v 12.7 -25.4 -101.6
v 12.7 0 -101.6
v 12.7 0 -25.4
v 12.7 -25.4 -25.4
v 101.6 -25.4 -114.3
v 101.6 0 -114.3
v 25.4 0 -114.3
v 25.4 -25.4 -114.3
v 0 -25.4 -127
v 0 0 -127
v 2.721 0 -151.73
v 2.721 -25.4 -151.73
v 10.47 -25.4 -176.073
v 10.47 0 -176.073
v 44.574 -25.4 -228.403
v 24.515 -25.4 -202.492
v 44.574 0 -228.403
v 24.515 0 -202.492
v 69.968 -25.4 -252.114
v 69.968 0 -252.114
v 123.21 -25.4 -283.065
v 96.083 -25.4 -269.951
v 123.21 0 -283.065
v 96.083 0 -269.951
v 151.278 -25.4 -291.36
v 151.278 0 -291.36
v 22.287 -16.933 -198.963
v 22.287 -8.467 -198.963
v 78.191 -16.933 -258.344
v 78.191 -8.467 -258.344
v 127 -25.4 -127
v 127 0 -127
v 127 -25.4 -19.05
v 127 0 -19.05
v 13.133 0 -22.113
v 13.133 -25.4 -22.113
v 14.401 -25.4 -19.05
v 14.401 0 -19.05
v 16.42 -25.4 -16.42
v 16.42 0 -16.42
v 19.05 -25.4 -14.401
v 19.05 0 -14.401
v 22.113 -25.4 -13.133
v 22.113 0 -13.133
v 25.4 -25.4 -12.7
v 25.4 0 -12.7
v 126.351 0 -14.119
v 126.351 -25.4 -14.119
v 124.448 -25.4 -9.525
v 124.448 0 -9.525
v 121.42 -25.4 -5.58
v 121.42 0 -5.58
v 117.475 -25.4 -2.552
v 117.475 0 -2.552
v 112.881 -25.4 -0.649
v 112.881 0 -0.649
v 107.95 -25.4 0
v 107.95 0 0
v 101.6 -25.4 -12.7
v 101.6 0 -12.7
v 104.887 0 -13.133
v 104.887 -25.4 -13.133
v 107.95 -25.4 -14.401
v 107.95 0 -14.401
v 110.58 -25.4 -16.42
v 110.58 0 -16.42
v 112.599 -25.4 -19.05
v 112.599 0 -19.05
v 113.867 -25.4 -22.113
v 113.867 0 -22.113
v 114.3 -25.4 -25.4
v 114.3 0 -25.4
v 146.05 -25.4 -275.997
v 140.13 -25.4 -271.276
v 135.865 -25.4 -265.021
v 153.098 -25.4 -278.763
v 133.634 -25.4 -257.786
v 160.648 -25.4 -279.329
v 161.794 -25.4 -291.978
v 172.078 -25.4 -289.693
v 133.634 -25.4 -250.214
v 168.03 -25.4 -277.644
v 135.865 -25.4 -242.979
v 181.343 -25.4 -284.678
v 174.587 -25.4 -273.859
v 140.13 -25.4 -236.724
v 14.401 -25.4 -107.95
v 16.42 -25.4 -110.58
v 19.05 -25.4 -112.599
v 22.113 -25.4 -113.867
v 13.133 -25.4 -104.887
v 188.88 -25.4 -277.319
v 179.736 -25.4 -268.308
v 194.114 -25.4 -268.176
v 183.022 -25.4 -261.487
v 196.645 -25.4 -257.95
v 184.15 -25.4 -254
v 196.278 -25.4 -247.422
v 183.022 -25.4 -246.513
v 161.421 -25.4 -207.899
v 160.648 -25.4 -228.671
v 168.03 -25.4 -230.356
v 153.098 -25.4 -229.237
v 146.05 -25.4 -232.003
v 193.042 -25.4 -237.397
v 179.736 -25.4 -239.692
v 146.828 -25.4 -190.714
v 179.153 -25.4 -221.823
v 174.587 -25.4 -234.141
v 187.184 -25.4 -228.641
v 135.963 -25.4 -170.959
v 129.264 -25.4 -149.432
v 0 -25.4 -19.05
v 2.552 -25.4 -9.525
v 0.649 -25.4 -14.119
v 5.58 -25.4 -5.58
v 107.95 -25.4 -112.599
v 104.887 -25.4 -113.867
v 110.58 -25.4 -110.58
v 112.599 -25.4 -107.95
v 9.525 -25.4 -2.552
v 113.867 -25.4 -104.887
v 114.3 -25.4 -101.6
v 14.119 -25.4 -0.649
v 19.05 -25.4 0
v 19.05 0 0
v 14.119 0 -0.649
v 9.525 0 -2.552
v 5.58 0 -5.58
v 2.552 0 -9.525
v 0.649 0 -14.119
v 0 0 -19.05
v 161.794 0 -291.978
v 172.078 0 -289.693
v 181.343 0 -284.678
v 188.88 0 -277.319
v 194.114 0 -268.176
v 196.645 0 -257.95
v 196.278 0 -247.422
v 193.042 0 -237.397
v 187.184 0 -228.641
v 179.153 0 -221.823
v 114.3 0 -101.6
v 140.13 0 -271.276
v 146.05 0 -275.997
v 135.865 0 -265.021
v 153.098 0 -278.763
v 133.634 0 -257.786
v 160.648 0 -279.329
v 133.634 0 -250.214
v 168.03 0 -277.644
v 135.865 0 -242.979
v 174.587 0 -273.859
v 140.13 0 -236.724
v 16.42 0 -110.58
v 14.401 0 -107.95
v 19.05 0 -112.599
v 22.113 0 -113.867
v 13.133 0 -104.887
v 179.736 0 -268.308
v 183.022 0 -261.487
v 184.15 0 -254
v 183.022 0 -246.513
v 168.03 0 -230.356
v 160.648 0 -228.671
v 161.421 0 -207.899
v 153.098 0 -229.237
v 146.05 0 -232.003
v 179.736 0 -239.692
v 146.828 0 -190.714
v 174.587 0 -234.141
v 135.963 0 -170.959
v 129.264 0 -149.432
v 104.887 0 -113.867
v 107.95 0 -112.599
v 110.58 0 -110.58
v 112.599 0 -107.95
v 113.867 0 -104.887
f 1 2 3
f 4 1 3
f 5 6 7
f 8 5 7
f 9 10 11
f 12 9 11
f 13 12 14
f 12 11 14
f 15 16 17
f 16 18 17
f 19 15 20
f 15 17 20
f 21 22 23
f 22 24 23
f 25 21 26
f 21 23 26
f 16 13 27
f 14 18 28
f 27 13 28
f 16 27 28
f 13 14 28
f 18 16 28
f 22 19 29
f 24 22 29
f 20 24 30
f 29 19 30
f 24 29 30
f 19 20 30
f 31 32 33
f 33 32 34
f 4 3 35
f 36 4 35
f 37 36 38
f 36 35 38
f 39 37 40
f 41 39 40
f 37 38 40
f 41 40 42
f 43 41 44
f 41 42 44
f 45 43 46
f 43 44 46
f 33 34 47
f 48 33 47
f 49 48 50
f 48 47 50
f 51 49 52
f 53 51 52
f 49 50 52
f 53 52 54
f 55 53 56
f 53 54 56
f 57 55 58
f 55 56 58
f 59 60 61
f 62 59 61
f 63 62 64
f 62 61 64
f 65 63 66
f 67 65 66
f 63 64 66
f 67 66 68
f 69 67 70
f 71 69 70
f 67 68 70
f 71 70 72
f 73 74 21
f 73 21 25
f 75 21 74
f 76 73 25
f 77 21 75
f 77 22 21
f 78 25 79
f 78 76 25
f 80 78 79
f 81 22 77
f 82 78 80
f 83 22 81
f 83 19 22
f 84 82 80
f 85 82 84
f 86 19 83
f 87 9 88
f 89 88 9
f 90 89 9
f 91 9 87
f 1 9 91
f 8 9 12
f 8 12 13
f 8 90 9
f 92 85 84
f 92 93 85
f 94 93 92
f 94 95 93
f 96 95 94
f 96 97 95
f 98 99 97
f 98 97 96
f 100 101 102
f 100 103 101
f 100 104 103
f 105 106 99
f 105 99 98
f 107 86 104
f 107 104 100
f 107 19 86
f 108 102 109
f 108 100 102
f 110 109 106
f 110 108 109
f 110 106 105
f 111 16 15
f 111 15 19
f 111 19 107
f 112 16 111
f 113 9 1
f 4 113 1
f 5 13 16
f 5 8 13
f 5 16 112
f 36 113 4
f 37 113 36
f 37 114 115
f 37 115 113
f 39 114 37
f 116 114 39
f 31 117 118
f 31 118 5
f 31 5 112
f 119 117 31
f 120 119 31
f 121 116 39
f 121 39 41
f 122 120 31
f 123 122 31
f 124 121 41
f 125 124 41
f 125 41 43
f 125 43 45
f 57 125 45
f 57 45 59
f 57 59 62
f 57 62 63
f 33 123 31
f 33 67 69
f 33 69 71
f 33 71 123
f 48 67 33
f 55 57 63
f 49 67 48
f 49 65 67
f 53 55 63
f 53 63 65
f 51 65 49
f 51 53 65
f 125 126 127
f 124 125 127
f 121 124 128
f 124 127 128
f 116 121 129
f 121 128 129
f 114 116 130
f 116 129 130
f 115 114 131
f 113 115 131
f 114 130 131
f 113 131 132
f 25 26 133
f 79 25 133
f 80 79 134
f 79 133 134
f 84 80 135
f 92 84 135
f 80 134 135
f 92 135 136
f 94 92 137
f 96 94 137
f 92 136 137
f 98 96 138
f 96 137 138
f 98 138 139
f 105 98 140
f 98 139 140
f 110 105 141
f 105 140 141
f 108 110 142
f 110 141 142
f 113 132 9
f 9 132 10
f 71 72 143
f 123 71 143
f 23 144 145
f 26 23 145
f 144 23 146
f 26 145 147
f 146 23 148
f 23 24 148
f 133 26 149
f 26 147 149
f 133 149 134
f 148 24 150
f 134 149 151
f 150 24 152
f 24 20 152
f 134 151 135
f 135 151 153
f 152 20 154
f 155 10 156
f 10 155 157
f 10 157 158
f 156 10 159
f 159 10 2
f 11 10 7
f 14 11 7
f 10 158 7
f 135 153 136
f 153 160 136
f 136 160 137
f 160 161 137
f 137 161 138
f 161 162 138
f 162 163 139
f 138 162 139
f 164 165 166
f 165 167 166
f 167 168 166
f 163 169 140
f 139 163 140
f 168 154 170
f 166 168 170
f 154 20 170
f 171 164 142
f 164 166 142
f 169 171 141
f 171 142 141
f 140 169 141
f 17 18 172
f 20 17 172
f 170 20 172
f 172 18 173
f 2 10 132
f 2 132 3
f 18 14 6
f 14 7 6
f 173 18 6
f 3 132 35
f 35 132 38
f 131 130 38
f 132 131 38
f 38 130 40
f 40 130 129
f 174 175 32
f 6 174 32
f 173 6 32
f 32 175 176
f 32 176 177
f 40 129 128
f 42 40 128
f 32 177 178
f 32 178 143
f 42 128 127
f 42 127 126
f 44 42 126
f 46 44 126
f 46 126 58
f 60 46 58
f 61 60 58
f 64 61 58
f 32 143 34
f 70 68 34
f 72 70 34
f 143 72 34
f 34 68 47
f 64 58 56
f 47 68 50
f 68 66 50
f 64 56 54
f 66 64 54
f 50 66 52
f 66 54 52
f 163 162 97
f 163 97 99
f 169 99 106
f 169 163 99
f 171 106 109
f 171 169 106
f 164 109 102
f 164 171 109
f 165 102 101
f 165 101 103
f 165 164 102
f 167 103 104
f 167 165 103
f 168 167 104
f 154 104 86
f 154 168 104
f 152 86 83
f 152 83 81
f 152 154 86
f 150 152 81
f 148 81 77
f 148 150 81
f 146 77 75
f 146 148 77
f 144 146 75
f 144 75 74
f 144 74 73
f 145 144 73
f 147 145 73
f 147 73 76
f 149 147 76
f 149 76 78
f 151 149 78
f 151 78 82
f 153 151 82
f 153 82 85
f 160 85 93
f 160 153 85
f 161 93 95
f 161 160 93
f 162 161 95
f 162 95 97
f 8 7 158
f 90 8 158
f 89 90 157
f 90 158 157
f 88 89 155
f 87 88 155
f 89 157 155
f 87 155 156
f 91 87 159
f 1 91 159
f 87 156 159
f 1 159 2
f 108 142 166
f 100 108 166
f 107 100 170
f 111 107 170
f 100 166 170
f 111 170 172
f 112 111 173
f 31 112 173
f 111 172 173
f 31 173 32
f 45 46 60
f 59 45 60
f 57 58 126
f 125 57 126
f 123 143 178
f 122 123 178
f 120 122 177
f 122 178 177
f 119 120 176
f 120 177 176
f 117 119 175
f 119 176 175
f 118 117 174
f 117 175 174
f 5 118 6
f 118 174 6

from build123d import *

# Parameters (mm, degrees)
F0_R     = 25.4
F1_DEPTH = 25.4


with BuildPart() as f1:
    # F0 (on Front) → F1 (new body)
    with BuildSketch(Plane.XZ):
        with BuildLine():
            Line((107.95, 0), (19.05, 0))
            ThreePointArc((19.05, 0), (5.579616, -5.579616), (0, -19.05))
            Line((0, -19.05), (0, -127))
            add(Edge.make_bspline(
                [(0, -127), (0, -200.66), (75.077975, -276.120124), (151.277975, -291.360124)],
                knots=[0, 0, 0, 0, 223.381459, 223.381459, 223.381459, 223.381459], degree=3))
            ThreePointArc((151.277975, -291.360124), (194.114391, -268.176383), (179.152879, -221.823417))
            ThreePointArc((179.152879, -221.823417), (140.898422, -181.109618), (127, -127))
            Line((127, -127), (127, -19.05))
            ThreePointArc((127, -19.05), (121.420384, -5.579616), (107.95, 0))
        make_face()
        with Locations((158.75, -254)):
            Circle(F0_R, mode=Mode.SUBTRACT)
        with BuildLine():
            Line((101.6, -114.3), (25.4, -114.3))
            ThreePointArc((25.4, -114.3), (16.419744, -110.580256), (12.7, -101.6))
            Line((12.7, -101.6), (12.7, -25.4))
            ThreePointArc((12.7, -25.4), (16.419744, -16.419744), (25.4, -12.7))
            Line((25.4, -12.7), (101.6, -12.7))
            ThreePointArc((101.6, -12.7), (110.580256, -16.419744), (114.3, -25.4))
            Line((114.3, -25.4), (114.3, -101.6))
            ThreePointArc((114.3, -101.6), (110.580256, -110.580256), (101.6, -114.3))
        make_face(mode=Mode.SUBTRACT)
    extrude(amount=F1_DEPTH)


solid = f1.part
